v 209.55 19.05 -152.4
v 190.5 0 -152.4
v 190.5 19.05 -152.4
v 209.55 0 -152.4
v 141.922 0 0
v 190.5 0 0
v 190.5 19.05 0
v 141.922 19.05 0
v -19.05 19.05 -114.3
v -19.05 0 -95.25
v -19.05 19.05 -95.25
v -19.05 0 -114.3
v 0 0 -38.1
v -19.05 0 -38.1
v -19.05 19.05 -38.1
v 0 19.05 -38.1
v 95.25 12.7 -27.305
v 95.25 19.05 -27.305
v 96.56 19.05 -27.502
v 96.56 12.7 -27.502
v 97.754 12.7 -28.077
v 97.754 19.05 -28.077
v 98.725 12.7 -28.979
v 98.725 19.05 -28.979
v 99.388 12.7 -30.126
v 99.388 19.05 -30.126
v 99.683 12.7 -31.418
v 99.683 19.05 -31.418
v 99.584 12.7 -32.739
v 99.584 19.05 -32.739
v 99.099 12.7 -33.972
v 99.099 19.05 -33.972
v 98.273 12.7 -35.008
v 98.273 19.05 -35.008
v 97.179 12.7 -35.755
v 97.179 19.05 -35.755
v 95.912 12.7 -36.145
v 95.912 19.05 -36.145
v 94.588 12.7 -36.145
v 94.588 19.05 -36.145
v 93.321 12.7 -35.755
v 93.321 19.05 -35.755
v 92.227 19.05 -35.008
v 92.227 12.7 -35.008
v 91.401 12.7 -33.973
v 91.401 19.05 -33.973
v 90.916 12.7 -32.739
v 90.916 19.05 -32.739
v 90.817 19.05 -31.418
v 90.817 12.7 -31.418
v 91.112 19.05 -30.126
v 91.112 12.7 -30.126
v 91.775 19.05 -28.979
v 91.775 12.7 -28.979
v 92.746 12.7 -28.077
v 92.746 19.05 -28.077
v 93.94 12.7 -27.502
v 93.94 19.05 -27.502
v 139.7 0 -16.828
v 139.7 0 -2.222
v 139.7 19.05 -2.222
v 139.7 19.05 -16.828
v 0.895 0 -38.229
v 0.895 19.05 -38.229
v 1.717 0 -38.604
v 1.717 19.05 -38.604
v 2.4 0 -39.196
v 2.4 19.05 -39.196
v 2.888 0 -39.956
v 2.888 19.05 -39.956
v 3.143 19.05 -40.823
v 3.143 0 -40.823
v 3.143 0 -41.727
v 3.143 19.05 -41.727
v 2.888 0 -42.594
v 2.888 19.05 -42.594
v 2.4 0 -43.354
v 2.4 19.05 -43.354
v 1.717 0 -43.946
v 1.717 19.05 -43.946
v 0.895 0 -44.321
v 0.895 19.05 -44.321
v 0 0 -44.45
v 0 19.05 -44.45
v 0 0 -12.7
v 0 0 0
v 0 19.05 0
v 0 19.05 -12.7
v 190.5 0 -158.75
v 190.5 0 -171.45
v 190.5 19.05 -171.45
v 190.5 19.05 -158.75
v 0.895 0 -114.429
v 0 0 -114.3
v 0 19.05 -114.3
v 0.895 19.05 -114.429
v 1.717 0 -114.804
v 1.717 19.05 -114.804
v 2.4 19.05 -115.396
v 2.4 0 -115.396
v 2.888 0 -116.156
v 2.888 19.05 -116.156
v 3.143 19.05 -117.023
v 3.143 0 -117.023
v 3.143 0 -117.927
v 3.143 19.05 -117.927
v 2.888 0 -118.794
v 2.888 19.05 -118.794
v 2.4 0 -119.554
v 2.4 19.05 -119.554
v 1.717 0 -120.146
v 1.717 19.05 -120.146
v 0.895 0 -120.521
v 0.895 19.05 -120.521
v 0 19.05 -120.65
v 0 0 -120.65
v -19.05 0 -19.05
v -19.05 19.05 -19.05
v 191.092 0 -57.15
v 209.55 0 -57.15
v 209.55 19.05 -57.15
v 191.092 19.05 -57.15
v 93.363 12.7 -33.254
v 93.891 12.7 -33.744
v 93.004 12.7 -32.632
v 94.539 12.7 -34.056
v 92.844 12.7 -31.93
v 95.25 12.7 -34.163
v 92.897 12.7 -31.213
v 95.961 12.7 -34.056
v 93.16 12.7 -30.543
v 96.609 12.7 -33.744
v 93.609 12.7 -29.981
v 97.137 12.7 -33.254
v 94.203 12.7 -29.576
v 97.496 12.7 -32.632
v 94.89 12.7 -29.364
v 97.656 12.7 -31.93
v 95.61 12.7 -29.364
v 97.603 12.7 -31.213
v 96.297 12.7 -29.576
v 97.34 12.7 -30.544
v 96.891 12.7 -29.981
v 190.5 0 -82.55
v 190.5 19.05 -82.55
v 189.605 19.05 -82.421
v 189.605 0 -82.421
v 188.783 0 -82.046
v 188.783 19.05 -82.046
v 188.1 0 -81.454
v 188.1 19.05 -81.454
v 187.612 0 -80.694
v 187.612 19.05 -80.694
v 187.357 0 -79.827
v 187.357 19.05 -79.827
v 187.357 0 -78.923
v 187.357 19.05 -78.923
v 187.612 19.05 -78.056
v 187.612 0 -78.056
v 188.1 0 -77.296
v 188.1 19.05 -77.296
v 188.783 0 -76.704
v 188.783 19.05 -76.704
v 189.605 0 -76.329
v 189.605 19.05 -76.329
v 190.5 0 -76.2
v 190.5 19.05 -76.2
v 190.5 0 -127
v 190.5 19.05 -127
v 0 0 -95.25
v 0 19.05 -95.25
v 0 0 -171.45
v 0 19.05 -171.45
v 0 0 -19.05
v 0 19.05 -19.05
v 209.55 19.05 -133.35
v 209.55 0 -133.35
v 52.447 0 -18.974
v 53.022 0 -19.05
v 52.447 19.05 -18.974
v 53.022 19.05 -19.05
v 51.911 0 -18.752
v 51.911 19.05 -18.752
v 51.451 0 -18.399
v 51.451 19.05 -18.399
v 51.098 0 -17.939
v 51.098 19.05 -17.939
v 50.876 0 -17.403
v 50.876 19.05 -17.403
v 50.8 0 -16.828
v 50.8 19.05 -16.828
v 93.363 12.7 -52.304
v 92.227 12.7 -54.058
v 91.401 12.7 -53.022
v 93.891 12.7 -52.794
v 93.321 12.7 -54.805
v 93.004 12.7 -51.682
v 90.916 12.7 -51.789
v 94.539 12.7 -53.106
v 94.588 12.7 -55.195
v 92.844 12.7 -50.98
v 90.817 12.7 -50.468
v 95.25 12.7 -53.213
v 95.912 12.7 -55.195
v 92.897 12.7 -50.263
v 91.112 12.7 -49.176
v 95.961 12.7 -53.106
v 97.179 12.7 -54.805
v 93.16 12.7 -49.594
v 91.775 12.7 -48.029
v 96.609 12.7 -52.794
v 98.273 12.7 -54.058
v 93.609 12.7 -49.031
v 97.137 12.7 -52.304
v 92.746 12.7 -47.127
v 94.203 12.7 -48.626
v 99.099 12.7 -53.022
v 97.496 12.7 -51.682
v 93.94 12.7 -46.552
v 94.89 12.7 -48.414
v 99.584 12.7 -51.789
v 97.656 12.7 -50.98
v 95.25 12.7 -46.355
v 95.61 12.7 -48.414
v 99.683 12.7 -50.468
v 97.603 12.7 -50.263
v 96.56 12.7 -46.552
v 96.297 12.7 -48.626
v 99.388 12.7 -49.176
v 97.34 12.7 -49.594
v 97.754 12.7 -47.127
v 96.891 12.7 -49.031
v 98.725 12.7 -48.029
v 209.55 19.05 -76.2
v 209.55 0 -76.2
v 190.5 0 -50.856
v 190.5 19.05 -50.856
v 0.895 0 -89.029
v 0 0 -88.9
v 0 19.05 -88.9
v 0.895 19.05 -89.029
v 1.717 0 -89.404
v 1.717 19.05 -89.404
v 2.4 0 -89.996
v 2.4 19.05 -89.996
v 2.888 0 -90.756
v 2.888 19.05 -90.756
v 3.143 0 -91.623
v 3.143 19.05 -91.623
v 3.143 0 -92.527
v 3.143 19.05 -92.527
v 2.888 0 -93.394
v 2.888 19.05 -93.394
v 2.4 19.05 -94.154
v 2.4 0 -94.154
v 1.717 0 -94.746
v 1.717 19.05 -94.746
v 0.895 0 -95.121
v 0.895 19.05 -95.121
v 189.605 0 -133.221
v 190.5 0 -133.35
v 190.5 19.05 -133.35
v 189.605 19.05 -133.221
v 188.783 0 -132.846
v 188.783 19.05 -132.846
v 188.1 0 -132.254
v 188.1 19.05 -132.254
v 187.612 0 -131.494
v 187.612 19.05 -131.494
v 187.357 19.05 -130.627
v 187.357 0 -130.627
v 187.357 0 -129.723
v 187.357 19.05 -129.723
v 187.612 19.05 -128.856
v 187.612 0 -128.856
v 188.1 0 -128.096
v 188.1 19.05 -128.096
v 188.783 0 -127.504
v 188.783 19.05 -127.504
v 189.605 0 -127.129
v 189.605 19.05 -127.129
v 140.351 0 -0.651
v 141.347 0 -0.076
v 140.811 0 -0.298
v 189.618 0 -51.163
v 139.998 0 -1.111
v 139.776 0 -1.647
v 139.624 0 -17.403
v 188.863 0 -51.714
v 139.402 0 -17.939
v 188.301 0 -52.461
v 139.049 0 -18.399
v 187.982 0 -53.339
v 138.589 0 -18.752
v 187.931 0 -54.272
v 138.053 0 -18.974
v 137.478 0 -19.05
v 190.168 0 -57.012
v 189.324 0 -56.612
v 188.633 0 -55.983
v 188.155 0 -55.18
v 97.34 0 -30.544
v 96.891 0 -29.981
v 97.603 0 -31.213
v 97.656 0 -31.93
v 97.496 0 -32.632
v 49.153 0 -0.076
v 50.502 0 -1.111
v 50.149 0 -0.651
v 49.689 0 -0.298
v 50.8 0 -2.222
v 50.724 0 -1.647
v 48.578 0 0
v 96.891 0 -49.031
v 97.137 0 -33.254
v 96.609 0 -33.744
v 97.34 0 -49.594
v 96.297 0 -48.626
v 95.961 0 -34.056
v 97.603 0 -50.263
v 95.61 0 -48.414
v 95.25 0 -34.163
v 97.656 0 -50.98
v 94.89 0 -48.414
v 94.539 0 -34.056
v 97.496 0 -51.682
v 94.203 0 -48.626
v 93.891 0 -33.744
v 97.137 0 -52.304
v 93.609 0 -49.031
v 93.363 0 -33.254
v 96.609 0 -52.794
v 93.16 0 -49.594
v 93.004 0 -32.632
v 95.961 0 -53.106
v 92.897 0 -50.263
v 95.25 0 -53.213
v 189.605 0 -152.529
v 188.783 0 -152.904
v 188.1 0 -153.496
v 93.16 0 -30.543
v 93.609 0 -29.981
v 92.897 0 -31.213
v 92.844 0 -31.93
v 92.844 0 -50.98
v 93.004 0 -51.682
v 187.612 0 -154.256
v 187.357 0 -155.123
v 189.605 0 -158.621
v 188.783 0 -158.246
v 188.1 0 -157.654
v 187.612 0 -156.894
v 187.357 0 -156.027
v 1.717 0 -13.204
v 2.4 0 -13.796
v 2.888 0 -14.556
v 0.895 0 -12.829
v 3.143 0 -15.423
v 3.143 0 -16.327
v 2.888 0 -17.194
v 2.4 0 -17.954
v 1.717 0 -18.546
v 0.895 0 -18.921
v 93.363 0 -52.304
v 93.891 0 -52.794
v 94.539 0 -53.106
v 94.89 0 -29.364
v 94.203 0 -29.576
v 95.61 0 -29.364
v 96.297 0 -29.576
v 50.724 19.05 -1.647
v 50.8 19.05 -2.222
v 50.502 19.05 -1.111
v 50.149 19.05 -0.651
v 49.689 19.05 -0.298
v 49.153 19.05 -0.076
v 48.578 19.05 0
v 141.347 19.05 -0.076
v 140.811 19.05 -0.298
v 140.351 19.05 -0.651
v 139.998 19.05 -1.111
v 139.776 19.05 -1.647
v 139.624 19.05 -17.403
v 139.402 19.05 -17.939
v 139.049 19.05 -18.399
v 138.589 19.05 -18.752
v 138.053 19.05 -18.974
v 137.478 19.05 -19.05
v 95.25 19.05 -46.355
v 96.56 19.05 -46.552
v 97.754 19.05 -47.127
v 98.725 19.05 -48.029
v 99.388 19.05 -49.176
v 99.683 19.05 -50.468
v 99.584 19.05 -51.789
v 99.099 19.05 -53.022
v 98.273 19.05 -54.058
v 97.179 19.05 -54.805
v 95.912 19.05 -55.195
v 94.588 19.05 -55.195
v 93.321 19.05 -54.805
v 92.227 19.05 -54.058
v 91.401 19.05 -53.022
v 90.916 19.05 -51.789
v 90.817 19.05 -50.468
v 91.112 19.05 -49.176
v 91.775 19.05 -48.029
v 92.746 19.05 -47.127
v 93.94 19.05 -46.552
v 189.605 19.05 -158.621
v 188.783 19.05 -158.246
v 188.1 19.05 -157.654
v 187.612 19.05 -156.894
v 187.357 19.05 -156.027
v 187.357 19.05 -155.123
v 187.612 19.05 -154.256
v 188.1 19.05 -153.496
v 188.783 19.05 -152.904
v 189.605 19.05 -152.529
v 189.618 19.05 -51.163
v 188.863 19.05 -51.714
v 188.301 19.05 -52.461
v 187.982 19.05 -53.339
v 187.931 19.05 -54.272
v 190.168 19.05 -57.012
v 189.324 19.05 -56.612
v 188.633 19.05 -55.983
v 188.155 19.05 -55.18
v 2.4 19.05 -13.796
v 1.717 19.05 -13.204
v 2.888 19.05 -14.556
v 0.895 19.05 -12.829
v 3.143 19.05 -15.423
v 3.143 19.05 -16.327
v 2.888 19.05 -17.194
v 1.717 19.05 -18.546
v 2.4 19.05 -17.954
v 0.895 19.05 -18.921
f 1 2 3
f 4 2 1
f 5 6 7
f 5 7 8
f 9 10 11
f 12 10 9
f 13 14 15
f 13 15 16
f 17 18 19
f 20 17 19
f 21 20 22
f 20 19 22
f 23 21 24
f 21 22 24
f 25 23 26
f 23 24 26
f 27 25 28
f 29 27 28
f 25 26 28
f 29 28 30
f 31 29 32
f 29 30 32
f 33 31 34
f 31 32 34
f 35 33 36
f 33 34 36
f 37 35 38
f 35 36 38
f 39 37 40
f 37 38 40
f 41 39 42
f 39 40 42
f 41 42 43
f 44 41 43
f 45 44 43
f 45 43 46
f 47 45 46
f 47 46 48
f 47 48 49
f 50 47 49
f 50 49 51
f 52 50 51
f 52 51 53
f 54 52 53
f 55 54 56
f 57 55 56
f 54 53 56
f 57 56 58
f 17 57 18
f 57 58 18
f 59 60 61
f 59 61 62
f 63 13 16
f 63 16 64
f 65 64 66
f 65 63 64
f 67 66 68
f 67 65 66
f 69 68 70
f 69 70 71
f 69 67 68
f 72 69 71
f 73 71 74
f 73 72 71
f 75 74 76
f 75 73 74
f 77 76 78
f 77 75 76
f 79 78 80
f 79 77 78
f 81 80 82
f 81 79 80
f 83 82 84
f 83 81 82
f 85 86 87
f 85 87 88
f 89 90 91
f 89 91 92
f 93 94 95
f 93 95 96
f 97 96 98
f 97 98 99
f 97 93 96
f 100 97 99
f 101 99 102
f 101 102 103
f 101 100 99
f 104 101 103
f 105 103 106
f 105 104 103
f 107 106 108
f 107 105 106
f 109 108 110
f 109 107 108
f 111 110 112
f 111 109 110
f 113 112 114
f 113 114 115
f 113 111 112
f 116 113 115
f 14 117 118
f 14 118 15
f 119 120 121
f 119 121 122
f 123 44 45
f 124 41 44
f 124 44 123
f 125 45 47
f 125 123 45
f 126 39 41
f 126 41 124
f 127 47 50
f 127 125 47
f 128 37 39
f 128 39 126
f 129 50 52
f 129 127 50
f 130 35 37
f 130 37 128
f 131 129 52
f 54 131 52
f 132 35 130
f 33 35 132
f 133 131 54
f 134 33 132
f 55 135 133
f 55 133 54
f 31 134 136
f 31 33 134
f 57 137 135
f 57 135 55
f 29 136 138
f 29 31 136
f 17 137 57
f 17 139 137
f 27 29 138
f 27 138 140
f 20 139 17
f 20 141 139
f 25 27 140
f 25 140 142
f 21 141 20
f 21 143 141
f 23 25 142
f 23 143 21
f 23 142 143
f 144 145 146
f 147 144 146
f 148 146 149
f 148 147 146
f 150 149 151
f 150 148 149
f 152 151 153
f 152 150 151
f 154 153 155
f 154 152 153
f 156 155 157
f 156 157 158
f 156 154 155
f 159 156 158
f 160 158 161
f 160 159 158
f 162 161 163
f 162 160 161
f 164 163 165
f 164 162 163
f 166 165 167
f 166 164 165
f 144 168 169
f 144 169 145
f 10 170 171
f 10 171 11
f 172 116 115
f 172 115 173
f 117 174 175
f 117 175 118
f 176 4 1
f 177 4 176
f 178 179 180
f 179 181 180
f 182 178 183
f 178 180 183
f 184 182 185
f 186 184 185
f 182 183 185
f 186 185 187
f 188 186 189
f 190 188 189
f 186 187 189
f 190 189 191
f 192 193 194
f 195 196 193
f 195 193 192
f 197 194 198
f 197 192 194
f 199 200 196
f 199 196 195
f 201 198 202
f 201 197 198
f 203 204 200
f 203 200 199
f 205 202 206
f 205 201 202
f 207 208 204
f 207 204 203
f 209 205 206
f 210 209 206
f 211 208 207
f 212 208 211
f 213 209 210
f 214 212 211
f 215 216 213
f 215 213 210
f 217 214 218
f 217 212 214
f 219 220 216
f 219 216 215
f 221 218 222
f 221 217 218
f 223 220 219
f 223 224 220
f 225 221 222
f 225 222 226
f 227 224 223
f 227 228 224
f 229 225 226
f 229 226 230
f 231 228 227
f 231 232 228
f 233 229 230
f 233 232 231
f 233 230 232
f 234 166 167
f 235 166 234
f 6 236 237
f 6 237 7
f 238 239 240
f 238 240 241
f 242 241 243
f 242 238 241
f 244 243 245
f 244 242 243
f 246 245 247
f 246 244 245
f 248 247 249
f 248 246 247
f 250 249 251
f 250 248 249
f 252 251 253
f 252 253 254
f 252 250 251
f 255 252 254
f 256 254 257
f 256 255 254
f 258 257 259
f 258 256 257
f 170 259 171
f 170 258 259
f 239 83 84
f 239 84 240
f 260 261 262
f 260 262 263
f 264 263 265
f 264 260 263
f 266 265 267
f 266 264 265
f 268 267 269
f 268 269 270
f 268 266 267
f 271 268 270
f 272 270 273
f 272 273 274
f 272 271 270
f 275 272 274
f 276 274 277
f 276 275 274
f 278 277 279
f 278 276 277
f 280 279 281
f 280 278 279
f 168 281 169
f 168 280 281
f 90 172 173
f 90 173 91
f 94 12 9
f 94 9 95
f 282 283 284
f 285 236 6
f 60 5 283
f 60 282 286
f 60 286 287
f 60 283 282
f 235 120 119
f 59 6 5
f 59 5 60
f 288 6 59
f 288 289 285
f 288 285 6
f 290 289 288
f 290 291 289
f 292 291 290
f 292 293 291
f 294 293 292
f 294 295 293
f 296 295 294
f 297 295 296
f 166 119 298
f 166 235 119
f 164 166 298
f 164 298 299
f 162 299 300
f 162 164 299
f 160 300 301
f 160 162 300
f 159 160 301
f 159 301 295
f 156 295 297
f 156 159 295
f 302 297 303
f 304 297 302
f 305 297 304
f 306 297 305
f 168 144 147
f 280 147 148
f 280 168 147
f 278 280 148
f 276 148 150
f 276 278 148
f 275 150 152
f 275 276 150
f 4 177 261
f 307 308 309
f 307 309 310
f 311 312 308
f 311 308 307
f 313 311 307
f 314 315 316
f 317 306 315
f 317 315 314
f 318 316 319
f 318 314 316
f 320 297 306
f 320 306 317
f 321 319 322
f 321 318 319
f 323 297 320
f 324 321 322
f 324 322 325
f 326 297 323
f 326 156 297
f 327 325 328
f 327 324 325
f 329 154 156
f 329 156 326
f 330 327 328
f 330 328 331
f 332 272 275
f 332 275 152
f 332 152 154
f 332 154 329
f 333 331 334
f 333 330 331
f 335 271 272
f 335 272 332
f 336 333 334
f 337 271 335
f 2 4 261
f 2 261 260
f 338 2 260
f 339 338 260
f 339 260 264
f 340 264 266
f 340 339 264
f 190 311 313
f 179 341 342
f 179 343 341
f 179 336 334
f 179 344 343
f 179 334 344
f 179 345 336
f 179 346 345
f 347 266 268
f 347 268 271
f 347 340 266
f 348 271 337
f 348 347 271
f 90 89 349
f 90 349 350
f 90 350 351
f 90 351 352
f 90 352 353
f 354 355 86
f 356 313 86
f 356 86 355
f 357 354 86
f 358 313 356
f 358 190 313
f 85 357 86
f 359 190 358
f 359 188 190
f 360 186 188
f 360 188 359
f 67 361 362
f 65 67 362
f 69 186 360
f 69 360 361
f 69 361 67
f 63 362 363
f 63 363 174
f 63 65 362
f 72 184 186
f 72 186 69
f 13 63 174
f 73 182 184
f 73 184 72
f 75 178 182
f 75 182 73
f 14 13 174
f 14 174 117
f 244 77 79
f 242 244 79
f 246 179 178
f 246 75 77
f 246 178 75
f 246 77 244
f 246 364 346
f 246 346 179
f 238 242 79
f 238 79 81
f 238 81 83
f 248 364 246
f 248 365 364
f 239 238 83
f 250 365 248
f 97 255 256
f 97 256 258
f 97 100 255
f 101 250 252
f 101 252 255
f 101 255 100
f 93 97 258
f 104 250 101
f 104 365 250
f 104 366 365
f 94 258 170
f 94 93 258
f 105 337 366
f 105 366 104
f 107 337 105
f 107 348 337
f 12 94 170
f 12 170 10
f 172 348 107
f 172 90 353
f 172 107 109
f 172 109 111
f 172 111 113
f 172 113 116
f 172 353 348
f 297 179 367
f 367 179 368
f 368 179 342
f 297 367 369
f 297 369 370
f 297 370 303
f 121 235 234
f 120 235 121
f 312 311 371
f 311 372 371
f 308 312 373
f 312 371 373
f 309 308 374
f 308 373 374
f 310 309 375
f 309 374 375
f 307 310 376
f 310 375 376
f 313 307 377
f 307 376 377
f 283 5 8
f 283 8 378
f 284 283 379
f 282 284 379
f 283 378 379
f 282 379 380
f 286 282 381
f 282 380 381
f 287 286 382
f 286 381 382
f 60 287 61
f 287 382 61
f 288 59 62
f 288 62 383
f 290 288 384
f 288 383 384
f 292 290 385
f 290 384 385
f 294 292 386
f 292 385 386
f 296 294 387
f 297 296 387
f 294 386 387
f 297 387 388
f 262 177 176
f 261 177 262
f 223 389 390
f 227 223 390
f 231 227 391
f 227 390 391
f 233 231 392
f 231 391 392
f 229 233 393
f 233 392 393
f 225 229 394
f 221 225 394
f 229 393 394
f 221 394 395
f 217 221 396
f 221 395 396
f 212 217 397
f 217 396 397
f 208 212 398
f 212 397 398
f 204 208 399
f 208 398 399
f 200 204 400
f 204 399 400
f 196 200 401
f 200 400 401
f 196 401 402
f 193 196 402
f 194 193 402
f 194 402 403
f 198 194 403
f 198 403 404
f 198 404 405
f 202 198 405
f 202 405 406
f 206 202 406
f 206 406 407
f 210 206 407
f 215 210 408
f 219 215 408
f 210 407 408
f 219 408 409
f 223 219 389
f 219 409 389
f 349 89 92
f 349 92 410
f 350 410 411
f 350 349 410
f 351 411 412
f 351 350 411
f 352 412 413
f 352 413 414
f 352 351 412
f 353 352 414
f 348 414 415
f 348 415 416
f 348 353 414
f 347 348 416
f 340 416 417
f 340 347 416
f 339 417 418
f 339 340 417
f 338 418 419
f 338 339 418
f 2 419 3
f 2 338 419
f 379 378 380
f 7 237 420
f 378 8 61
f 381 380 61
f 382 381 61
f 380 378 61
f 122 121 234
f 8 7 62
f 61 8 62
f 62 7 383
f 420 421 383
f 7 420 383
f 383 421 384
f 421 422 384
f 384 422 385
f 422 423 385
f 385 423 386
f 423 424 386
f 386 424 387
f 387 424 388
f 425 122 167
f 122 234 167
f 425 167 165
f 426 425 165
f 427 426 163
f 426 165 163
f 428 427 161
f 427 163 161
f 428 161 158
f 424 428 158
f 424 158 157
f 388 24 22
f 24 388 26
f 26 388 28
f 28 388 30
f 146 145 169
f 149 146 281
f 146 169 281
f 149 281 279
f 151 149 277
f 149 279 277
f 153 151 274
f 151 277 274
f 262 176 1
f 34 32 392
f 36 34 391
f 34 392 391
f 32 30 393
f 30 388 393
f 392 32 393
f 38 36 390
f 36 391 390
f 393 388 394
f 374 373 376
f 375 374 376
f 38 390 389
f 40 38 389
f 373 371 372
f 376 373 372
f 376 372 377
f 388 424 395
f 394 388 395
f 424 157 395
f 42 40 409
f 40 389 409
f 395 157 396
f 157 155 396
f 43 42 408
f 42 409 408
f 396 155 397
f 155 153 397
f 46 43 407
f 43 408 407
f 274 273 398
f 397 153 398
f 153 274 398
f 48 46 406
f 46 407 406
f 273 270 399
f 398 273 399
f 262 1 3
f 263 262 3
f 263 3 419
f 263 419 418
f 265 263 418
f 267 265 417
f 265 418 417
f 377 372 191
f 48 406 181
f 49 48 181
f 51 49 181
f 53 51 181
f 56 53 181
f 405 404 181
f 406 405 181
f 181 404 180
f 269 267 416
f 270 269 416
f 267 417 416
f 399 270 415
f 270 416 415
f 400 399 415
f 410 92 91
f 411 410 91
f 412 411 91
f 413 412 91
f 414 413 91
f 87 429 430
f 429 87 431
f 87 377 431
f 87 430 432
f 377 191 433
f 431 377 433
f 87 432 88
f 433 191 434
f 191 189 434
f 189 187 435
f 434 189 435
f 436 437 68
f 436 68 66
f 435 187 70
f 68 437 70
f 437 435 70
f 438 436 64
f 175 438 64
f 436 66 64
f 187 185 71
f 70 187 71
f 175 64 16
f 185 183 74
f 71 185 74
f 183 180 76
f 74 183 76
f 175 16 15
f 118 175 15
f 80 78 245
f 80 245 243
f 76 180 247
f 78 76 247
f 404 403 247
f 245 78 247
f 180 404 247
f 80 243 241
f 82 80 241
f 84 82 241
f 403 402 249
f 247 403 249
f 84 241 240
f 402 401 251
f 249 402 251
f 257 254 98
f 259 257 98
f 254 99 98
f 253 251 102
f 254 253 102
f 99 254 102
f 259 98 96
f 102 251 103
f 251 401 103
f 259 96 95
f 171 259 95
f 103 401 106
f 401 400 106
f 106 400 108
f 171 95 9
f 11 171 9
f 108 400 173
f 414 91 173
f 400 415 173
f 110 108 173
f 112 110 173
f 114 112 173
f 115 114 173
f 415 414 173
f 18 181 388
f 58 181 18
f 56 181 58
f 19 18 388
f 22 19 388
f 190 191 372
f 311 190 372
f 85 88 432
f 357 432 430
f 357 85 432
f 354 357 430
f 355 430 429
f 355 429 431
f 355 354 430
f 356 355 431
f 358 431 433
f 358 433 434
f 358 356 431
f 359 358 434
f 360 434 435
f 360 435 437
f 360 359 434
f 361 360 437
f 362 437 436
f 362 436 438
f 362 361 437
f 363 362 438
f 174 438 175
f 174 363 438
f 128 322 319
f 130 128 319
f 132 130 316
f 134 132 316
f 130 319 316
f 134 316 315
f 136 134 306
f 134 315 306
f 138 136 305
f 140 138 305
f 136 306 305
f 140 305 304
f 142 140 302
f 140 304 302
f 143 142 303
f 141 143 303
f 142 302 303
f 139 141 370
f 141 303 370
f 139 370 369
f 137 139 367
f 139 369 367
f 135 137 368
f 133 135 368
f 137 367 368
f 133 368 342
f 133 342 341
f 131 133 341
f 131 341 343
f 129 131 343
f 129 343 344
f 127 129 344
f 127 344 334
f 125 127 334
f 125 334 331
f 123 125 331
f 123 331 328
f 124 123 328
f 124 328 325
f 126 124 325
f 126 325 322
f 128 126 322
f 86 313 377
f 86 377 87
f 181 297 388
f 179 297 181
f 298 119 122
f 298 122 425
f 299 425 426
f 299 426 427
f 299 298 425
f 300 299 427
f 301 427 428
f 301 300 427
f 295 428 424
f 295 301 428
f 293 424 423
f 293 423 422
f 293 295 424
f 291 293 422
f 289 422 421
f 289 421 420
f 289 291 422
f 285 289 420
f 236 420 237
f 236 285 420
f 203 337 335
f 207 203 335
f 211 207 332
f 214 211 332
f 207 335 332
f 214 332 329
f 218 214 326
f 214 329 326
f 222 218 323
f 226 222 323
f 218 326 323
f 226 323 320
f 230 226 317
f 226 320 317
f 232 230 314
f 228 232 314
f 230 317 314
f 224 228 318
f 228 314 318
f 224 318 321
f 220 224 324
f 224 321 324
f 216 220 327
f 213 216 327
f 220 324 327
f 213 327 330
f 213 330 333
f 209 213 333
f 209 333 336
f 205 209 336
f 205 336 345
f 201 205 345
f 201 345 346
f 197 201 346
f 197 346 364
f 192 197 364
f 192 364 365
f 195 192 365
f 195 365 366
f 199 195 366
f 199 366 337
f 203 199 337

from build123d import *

# Parameters (mm, degrees)
BOSS_EXTRUDE1_DEPTH = 19.05
FILLET1_R           = 2.2225
SKETCH2_R           = 2.413
CUT_EXTRUDE1_DEPTH  = 272.420720469
SKETCH3_R           = 4.445
CUT_EXTRUDE2_DEPTH  = 6.35


with BuildPart() as part:
    # Sketch1 → Boss-Extrude1 (new body)
    with BuildSketch(Plane(origin=(0, 0, 0), x_dir=(1, 0, 0), z_dir=(0, 1, 0))):
        with BuildLine():
            Line((190.5, 171.45), (0, 171.45))
            Line((0, 171.45), (0, 120.65))
            ThreePointArc((0, 120.65), (3.175, 117.475), (0, 114.3))
            Line((0, 114.3), (-19.05, 114.3))
            Line((-19.05, 114.3), (-19.05, 95.25))
            Line((-19.05, 95.25), (0, 95.25))
            ThreePointArc((0, 95.25), (3.175, 92.075), (0, 88.9))
            Line((0, 88.9), (0, 44.45))
            ThreePointArc((0, 44.45), (3.175, 41.275), (0, 38.1))
            Line((0, 38.1), (-19.05, 38.1))
            Line((-19.05, 38.1), (-19.05, 19.05))
            Line((-19.05, 19.05), (0, 19.05))
            ThreePointArc((0, 19.05), (3.175, 15.875), (0, 12.7))
            Line((0, 12.7), (0, 0))
            Line((0, 0), (50.8, 0))
            Line((50.8, 0), (50.8, 19.05))
            Line((50.8, 19.05), (139.7, 19.05))
            Line((139.7, 19.05), (139.7, 0))
            Line((139.7, 0), (190.5, 0))
            Line((190.5, 0), (190.5, 50.855736572))
            ThreePointArc((190.5, 50.855736572), (187.931266017, 54.272458919), (191.092301163, 57.15))
            Line((191.092301163, 57.15), (209.55, 57.15))
            Line((209.55, 57.15), (209.55, 76.2))
            Line((209.55, 76.2), (190.5, 76.2))
            ThreePointArc((190.5, 76.2), (187.325, 79.375), (190.5, 82.55))
            Line((190.5, 82.55), (190.5, 127))
            ThreePointArc((190.5, 127), (187.325, 130.175), (190.5, 133.35))
            Line((190.5, 133.35), (209.55, 133.35))
            Line((209.55, 133.35), (209.55, 152.4))
            Line((209.55, 152.4), (190.5, 152.4))
            ThreePointArc((190.5, 152.4), (187.325, 155.575), (190.5, 158.75))
            Line((190.5, 158.75), (190.5, 171.45))
        make_face()
    extrude(amount=BOSS_EXTRUDE1_DEPTH)

    # Fillet1
    fillet1_edges = [part.edges().sort_by_distance(p)[0] for p in [
        (139.7, 9.525, 0),
        (139.7, 9.525, -19.05),
        (50.8, 9.525, -19.05),
        (50.8, 9.525, 0),
    ]]
    fillet(fillet1_edges, radius=FILLET1_R)

    # Sketch2 → Cut-Extrude1 (cut, through all)
    with BuildSketch(Plane.XZ):
        with Locations((95.25, -31.75)):
            Circle(SKETCH2_R)
        with Locations((95.25, -50.8)):
            Circle(SKETCH2_R)
    extrude(amount=-CUT_EXTRUDE1_DEPTH, mode=Mode.SUBTRACT)

    # Sketch3 → Cut-Extrude2 (cut)
    with BuildSketch(Plane(origin=(0, 19.05, 0), x_dir=(1, 0, 0), z_dir=(0, 1, 0))):
        with Locations((95.25, 31.75)):
            Circle(SKETCH3_R)
        with Locations((95.25, 50.8)):
            Circle(SKETCH3_R)
    extrude(amount=-CUT_EXTRUDE2_DEPTH, mode=Mode.SUBTRACT)


solid = part.part
